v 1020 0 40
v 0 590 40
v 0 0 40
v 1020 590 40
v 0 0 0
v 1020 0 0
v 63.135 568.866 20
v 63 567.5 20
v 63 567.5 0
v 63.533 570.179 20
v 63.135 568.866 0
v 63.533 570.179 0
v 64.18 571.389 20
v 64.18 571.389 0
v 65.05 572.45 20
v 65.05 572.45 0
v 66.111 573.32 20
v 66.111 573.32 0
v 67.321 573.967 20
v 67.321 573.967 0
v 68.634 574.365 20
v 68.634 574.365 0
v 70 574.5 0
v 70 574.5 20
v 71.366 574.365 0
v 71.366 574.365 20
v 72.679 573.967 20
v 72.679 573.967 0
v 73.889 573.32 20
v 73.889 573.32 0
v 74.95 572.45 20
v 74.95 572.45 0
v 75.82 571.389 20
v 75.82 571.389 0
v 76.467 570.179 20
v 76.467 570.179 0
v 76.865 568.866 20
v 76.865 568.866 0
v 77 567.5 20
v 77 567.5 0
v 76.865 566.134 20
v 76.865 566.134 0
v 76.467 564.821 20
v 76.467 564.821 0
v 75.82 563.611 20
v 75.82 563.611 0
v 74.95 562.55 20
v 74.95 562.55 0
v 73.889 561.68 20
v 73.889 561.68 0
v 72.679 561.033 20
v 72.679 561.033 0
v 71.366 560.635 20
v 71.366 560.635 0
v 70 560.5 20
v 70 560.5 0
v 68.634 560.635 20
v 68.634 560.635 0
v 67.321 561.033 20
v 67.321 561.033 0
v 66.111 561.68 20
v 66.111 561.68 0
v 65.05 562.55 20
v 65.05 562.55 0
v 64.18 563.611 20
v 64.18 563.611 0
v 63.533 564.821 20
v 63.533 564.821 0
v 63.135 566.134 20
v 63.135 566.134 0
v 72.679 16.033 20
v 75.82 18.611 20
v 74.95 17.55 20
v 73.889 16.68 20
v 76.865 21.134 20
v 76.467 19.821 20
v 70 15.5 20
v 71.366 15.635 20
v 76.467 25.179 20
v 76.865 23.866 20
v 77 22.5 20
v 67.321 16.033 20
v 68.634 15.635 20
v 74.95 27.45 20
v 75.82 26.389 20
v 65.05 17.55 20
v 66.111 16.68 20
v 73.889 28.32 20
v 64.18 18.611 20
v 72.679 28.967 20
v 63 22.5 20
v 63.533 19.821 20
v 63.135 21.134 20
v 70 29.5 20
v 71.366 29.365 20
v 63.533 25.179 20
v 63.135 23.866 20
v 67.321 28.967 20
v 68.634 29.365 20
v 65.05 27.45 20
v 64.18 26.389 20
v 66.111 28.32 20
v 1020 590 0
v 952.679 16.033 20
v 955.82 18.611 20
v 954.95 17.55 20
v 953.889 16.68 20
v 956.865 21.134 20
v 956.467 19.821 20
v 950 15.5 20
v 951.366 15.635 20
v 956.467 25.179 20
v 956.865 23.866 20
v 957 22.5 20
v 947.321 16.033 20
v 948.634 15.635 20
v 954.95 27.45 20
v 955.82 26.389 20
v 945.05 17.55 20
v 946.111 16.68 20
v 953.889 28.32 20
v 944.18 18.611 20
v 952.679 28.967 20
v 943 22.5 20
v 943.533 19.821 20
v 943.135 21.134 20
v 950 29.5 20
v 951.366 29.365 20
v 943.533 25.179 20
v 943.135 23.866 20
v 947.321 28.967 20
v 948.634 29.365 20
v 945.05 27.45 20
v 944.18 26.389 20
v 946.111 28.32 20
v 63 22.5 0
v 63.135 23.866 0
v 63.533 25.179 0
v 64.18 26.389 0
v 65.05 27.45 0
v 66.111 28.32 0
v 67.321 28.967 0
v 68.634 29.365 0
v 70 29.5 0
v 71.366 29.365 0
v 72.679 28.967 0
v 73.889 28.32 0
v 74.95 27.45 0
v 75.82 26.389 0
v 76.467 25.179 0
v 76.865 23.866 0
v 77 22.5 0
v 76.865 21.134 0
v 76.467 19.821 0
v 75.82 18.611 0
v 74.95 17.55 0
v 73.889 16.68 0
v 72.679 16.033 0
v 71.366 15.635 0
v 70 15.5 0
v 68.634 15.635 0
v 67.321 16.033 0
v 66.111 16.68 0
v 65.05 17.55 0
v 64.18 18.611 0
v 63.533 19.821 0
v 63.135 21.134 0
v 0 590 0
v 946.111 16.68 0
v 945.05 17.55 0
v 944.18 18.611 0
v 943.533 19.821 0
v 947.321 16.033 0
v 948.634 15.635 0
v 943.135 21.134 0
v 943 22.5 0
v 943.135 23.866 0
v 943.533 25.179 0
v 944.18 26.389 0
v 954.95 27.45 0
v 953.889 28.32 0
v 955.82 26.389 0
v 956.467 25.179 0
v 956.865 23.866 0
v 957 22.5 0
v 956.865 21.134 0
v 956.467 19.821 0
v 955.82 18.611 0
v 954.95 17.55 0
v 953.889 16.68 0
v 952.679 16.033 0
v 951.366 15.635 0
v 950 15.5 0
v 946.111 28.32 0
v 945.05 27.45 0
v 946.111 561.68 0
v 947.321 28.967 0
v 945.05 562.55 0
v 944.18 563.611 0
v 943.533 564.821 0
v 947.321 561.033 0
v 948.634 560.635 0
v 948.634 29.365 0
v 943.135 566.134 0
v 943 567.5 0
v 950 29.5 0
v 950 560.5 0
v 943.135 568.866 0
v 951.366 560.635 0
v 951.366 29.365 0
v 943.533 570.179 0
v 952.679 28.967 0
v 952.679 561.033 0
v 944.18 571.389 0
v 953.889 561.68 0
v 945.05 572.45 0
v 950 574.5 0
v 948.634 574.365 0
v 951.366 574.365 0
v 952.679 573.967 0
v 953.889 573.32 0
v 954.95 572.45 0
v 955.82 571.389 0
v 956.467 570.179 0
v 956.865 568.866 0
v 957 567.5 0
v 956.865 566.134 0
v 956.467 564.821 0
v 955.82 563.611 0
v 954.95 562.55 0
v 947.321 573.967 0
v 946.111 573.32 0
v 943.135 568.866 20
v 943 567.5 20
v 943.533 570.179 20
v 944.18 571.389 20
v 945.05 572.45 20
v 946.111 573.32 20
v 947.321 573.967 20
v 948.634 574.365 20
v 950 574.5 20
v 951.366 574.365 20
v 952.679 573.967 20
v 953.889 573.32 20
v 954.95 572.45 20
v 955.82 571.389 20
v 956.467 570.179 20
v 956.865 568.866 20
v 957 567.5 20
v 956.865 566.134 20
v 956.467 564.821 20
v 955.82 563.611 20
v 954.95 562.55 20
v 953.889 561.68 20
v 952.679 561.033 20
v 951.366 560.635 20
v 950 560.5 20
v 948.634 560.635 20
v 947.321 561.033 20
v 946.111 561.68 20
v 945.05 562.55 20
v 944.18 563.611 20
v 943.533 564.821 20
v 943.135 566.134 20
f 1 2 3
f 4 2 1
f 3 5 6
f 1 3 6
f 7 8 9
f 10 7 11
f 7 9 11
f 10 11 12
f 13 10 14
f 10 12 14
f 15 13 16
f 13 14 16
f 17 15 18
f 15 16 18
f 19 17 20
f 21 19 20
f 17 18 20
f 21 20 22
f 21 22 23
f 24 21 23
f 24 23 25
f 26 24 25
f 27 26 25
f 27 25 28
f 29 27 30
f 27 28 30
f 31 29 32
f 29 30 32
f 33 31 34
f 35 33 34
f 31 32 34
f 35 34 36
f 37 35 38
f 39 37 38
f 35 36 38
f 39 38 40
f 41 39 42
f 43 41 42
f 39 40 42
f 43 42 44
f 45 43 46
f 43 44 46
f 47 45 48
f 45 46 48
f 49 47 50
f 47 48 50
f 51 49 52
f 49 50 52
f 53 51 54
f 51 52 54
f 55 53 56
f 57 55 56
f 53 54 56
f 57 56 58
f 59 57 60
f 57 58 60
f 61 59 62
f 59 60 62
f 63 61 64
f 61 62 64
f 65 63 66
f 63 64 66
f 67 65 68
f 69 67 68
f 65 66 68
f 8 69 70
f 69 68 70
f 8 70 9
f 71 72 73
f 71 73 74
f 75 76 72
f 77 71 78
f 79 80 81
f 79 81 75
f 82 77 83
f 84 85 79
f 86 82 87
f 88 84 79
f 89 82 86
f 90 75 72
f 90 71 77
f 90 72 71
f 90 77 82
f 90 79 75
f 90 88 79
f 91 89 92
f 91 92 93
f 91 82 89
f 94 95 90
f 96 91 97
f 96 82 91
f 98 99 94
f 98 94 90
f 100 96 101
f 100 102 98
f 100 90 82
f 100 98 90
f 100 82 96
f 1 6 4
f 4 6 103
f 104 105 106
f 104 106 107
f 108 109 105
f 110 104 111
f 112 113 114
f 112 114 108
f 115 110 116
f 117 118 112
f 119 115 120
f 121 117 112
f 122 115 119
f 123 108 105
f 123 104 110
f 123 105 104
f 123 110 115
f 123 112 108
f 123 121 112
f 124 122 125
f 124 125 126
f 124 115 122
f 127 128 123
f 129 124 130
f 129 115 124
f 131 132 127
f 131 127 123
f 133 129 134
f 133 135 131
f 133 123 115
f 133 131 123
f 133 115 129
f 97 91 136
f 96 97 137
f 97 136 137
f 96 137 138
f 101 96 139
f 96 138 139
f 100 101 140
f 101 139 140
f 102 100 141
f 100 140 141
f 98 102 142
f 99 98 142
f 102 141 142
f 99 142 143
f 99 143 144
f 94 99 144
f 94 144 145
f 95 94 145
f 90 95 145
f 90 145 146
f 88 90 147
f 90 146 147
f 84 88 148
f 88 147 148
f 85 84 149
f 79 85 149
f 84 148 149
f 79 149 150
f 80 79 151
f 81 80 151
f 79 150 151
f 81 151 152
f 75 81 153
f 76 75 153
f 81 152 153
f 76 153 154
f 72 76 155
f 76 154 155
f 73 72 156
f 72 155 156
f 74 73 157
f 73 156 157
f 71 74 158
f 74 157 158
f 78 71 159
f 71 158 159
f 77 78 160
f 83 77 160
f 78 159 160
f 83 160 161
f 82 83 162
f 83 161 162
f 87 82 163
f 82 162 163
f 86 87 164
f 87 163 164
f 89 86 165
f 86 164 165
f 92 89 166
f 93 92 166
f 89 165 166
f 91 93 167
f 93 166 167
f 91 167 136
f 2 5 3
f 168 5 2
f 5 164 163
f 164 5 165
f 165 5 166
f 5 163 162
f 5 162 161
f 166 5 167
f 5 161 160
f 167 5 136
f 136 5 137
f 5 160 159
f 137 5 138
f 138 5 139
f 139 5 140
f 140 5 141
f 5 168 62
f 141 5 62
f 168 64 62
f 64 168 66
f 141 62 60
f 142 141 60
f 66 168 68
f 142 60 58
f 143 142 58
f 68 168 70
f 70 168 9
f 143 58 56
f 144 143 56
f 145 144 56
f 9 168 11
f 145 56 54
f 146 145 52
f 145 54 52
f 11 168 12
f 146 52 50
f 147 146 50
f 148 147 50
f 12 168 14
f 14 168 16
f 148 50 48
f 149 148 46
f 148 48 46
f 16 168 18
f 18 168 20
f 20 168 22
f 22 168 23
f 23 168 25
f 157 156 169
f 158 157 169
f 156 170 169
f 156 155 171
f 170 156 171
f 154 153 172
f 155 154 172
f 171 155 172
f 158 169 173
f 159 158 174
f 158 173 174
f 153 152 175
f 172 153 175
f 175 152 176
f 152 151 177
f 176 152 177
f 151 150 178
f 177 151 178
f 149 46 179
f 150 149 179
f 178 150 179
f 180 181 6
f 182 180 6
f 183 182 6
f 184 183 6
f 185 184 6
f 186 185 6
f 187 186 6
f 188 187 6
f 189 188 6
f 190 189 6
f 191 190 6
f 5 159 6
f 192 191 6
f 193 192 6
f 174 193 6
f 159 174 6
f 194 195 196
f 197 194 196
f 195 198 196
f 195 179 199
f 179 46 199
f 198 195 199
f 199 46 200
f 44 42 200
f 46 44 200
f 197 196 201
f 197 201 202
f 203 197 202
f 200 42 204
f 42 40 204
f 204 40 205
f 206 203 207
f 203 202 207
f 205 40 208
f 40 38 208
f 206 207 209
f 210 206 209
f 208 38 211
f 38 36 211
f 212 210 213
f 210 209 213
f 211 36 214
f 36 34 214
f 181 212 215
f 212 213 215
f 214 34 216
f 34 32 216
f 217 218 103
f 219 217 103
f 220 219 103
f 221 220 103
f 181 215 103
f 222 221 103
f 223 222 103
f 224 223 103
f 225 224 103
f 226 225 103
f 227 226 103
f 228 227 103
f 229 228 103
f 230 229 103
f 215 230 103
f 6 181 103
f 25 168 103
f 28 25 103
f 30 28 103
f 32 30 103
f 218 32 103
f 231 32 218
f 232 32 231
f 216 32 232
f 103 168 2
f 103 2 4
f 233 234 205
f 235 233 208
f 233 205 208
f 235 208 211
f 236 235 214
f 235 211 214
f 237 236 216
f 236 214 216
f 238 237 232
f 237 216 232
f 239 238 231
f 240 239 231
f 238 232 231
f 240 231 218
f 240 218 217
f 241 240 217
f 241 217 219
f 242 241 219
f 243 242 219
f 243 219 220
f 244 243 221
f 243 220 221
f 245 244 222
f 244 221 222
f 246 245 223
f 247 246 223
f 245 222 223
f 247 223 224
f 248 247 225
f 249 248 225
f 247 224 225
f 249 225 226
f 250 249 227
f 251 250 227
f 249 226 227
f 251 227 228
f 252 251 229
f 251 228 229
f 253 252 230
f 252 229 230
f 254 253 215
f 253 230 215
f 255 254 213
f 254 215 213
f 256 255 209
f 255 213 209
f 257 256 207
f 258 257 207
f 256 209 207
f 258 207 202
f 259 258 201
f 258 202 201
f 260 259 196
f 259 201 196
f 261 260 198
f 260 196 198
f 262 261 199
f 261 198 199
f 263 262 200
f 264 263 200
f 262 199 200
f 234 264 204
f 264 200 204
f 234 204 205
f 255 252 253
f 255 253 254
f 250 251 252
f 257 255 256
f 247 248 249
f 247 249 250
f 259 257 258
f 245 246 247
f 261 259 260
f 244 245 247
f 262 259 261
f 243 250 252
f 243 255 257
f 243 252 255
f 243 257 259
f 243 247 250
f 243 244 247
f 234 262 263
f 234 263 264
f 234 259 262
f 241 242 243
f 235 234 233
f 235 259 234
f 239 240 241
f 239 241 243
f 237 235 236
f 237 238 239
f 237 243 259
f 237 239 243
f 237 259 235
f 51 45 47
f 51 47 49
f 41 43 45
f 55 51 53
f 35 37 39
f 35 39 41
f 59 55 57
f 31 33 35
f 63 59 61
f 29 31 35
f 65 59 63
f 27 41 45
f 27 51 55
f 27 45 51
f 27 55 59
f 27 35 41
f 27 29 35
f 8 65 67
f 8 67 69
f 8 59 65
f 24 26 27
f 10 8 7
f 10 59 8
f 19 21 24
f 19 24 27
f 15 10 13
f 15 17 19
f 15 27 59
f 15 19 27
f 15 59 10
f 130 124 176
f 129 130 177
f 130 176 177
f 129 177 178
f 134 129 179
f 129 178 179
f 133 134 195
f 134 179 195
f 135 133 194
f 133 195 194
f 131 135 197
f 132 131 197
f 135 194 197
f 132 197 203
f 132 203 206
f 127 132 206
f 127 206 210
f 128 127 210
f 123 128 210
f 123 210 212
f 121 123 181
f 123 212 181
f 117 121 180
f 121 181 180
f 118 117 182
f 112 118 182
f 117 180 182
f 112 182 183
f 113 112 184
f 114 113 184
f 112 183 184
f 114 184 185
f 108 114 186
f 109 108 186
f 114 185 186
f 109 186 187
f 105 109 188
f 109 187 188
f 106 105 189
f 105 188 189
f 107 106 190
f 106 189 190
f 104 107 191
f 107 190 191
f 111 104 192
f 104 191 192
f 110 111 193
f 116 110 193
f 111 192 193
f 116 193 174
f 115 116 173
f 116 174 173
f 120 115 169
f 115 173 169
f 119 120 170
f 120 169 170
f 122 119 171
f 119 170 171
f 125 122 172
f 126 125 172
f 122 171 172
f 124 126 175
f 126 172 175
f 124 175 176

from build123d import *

# Parameters (mm, degrees)
CROQUIS1_W              = 1020
CROQUIS1_H              = 590
SALIENTE_EXTRUIR1_DEPTH = 40
CROQUIS2_R              = 7
CORTAR_EXTRUIR1_DEPTH   = 20


with BuildPart() as part:
    # Croquis1 → Saliente-Extruir1 (new body)
    with BuildSketch(Plane.XY):
        with Locations((510, 295)):
            Rectangle(CROQUIS1_W, CROQUIS1_H)
    extrude(amount=SALIENTE_EXTRUIR1_DEPTH)

    # Croquis2 → Cortar-Extruir1 (cut)
    with BuildSketch(Plane(origin=(0, 0, 0), x_dir=(-1, 0, 0), z_dir=(0, 0, -1))):
        with Locations((-70, 22.5)):
            Circle(CROQUIS2_R)
        with Locations((-70, 567.5)):
            Circle(CROQUIS2_R)
        with Locations((-950, 567.5)):
            Circle(CROQUIS2_R)
        with Locations((-950, 22.5)):
            Circle(CROQUIS2_R)
    extrude(amount=-CORTAR_EXTRUIR1_DEPTH, mode=Mode.SUBTRACT)


solid = part.part
